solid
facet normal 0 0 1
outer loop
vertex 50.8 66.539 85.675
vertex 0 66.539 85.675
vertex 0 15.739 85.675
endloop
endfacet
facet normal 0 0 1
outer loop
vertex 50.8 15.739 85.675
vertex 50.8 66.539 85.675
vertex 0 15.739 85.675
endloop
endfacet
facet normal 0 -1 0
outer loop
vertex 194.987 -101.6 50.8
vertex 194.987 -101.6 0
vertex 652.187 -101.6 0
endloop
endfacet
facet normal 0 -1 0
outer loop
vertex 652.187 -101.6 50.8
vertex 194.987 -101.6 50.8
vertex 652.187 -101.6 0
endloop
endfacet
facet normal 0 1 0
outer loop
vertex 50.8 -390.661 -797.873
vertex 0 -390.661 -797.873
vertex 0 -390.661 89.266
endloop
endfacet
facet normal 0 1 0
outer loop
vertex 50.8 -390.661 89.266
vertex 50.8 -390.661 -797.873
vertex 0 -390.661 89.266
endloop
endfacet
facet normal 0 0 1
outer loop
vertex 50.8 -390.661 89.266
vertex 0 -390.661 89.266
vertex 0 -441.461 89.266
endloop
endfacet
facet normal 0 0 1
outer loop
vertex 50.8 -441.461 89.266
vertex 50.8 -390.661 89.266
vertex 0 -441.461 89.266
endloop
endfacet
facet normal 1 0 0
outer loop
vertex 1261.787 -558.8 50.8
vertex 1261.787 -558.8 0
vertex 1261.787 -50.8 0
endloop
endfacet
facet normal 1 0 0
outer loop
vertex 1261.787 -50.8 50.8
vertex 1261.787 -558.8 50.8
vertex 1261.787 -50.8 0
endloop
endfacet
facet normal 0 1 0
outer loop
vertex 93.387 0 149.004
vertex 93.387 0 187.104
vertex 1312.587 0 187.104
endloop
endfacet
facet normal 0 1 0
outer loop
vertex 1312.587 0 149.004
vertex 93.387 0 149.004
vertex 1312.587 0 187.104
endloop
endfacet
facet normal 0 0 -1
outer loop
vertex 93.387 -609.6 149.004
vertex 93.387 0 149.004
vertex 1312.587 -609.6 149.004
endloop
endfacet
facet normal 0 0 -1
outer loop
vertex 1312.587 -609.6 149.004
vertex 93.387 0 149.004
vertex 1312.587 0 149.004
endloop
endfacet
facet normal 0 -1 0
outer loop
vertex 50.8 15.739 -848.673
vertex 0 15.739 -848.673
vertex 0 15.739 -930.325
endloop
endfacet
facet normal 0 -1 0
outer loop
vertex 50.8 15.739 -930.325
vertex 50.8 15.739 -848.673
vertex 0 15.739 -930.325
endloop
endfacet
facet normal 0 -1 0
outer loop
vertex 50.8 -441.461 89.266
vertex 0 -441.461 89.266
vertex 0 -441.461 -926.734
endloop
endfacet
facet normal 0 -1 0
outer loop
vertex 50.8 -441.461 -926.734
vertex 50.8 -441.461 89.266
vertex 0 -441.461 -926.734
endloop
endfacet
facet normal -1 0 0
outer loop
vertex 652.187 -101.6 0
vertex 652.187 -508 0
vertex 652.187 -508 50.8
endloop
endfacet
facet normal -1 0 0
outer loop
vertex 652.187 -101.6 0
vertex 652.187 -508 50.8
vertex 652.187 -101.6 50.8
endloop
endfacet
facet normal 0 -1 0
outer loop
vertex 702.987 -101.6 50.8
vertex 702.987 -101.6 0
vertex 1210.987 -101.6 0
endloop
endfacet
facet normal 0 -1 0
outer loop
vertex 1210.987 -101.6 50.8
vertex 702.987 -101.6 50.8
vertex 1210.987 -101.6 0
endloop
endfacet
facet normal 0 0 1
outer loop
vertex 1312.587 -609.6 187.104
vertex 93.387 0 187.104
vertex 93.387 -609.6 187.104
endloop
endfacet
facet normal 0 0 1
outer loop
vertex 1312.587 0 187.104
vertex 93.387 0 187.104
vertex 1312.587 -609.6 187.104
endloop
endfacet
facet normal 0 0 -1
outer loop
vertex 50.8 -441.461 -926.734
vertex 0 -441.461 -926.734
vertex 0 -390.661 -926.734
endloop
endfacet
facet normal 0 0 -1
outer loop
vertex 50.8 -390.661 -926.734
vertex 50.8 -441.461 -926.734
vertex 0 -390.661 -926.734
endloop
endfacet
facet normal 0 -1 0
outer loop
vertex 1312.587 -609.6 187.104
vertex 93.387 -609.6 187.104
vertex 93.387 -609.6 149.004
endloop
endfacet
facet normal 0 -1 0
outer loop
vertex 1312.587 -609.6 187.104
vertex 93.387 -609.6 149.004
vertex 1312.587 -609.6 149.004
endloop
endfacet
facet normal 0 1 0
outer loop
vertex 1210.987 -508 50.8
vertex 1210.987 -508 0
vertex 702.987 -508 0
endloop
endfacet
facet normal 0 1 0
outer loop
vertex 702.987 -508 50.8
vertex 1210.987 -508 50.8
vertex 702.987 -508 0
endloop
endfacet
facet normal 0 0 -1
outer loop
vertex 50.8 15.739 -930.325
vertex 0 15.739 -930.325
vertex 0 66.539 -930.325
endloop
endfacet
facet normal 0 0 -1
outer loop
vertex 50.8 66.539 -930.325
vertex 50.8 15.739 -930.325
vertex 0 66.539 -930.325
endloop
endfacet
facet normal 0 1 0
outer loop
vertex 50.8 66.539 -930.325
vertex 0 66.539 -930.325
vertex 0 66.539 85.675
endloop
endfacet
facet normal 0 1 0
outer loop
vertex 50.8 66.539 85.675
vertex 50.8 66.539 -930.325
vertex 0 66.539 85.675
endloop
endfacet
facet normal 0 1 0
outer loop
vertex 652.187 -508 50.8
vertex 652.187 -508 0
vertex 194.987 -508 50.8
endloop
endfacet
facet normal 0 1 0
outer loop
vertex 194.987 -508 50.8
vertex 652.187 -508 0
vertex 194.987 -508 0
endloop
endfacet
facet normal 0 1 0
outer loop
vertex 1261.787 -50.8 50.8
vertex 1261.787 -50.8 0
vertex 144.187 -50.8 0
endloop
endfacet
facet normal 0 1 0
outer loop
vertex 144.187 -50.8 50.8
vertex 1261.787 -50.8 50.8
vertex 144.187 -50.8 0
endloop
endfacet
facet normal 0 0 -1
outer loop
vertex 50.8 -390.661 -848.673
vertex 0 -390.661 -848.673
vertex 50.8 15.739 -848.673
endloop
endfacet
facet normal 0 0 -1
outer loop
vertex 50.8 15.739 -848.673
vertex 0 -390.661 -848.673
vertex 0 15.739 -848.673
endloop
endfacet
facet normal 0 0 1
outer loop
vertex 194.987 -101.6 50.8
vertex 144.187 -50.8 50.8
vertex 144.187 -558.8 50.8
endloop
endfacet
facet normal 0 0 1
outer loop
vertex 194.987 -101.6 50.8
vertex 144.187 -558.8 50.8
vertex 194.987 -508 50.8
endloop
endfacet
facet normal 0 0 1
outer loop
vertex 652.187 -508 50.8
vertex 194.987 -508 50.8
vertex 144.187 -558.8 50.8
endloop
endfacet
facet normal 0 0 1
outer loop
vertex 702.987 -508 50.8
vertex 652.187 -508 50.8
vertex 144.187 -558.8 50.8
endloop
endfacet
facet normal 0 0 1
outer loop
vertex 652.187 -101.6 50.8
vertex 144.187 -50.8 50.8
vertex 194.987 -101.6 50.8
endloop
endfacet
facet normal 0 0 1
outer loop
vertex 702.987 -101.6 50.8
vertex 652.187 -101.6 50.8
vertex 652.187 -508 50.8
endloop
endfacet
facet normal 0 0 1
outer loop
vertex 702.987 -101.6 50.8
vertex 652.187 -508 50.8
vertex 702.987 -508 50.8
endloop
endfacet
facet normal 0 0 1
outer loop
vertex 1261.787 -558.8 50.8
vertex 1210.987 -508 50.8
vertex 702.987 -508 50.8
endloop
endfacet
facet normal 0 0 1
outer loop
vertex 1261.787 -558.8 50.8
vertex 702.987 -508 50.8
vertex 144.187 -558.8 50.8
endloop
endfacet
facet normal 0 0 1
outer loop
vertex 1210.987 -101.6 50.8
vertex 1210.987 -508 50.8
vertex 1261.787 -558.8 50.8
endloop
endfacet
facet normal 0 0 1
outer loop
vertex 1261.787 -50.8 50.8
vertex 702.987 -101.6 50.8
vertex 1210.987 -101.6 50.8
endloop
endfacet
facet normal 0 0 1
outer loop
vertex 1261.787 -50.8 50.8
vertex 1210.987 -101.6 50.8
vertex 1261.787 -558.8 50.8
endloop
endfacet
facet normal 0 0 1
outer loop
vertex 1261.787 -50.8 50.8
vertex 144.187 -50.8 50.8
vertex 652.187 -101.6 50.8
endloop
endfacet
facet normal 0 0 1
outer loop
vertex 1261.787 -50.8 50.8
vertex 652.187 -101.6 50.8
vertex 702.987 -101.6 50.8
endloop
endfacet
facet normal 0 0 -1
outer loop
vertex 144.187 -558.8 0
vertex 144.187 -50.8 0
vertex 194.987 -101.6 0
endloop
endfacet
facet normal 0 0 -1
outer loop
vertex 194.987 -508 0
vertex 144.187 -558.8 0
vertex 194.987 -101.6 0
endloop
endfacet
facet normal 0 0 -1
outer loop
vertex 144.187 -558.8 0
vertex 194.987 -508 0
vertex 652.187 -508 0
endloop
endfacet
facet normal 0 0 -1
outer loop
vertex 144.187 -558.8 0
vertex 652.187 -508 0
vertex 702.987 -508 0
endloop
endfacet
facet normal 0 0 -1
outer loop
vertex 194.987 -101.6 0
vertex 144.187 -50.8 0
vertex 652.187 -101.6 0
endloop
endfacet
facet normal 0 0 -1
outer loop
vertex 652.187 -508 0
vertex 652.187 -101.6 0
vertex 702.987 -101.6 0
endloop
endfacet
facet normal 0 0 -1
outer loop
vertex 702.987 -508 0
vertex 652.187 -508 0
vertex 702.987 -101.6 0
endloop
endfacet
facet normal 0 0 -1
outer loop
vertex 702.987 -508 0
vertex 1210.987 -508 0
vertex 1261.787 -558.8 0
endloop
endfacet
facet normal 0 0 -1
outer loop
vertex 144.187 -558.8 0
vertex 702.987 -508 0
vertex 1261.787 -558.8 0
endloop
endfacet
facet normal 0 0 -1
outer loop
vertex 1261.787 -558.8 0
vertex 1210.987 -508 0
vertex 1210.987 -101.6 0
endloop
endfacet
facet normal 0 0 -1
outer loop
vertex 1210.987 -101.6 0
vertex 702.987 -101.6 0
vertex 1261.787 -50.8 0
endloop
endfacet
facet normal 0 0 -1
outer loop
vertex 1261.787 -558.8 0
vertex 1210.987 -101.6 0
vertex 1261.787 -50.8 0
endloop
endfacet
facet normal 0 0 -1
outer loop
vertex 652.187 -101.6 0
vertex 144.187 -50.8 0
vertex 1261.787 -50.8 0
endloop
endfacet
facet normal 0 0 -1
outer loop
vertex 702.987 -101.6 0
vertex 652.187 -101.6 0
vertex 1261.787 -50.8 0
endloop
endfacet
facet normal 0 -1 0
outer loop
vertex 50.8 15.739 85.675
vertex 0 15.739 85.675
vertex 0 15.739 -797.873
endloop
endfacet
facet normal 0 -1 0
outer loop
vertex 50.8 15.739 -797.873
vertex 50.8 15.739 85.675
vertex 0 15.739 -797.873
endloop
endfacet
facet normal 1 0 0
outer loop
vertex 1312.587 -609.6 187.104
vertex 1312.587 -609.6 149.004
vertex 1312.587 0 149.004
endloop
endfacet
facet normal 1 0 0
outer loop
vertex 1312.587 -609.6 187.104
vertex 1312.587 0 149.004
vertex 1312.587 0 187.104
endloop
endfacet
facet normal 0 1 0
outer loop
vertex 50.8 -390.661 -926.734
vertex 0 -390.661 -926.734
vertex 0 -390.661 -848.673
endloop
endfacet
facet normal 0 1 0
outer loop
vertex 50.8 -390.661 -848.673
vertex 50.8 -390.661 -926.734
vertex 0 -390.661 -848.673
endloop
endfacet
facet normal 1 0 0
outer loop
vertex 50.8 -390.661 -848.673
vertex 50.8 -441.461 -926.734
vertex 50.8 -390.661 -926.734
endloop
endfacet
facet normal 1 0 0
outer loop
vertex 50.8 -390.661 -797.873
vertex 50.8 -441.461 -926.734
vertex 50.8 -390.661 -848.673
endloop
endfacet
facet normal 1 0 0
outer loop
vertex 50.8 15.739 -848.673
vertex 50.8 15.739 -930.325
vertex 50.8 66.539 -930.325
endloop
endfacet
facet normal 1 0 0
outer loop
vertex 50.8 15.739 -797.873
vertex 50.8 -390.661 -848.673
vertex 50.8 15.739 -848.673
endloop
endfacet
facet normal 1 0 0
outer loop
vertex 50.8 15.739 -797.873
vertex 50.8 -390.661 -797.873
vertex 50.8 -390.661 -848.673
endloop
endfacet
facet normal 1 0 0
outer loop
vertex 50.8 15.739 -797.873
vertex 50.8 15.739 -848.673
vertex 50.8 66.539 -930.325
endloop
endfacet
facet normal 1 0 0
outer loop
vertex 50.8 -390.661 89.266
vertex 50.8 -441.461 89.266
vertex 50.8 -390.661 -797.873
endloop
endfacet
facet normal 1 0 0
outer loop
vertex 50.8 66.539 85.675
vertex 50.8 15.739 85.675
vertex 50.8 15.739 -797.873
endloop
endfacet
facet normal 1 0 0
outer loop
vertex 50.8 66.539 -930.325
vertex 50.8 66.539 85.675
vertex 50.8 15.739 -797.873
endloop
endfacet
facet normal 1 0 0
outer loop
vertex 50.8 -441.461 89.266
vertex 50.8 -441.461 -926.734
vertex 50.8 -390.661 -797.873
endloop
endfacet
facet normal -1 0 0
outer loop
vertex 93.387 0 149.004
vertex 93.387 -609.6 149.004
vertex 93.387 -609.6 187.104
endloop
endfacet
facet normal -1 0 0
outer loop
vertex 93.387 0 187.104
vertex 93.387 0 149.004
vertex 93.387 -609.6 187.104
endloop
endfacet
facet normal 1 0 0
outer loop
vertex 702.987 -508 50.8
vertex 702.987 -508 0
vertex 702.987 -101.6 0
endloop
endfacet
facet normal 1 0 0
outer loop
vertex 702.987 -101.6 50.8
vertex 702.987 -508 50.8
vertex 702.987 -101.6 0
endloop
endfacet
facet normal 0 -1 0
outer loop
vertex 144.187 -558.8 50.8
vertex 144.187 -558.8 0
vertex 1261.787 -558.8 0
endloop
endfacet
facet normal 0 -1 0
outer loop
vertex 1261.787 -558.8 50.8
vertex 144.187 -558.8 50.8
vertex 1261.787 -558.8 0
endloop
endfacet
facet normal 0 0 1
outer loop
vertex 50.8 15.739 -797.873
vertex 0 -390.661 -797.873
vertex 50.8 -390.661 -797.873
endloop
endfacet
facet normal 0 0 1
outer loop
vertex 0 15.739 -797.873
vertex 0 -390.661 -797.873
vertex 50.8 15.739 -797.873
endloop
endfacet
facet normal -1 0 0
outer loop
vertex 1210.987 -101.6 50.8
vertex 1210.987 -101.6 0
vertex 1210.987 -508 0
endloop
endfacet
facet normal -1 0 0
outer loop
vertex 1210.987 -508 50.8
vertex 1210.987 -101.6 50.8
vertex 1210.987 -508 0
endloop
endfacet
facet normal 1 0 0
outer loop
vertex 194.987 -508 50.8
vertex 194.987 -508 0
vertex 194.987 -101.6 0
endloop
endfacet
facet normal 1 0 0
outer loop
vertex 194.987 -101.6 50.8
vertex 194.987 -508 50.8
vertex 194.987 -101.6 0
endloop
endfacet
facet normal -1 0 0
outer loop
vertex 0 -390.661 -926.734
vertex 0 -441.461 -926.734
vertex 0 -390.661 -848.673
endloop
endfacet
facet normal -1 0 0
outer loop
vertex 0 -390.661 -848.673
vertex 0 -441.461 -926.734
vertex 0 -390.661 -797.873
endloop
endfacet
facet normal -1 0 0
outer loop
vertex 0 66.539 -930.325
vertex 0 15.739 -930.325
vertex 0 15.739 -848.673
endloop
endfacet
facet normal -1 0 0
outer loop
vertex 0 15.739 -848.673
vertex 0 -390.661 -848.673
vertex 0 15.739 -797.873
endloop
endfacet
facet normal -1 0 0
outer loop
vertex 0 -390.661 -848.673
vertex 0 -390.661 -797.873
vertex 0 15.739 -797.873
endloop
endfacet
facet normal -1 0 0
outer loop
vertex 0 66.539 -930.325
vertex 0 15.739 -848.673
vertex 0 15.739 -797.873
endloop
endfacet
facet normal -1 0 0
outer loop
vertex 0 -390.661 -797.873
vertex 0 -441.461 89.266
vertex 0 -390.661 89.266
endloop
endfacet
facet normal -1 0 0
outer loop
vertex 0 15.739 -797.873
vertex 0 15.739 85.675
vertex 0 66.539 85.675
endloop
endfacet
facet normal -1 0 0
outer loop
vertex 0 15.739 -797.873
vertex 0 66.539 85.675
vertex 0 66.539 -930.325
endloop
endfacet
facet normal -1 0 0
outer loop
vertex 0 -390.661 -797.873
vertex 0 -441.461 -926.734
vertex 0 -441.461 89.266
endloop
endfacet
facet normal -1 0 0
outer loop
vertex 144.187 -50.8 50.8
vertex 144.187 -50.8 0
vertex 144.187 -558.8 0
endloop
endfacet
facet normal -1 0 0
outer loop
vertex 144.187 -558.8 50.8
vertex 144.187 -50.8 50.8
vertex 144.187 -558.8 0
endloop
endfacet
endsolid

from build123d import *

# Parameters (mm, degrees)
F0_W     = 406.4
F0_H     = 50.8
F1_DEPTH = 50.8
F2_W     = 1219.2
F2_H     = 38.1
F3_DEPTH = 609.6
F4_W     = 50.8
F4_H     = 50.8
F4_W_2   = 508
F4_H_2   = 406.4
F4_W_3   = 457.2
F5_DEPTH = 50.8


with BuildPart() as f1:
    # F0 (on Right) → F1 (new body)
    with BuildSketch(Plane.YZ):
        Polygon((66.5393716931, -930.3252109869), (66.5393716931, 85.6747890131), (15.7393716931, 85.6747890131), (15.7393716931, -797.8733963936), (15.7393716931, -848.6733963936), (15.7393716931, -930.3252109869), align=None)
        with Locations((-187.4606283069, -823.2733963936)):
            Rectangle(F0_W, F0_H)
        Polygon((-390.6606283069, -848.6733963936), (-390.6606283069, -797.8733963936), (-390.6606283069, 89.2663273811), (-441.4606283069, 89.2663273811), (-441.4606283069, -926.7336726189), (-390.6606283069, -926.7336726189), align=None)
    extrude(amount=F1_DEPTH)


with BuildPart() as f3:
    # F2 (on Front) → F3 (new body)
    with BuildSketch(Plane.XZ):
        with Locations((702.9868088187, 168.0535152555)):
            Rectangle(F2_W, F2_H)
    extrude(amount=F3_DEPTH)


with BuildPart() as f5:
    # F4 (on Top) → F5 (new body)
    with BuildSketch(Plane.XY):
        with Locations((1236.3868088187, -76.2)):
            Rectangle(F4_W, F4_H)
        with Locations((956.9868088187, -76.2)):
            Rectangle(F4_W_2, F4_H)
        with Locations((1236.3868088187, -304.8)):
            Rectangle(F4_W, F4_H_2)
        with Locations((677.5868088187, -76.2)):
            Rectangle(F4_W, F4_H)
        with Locations((1236.3868088187, -533.4)):
            Rectangle(F4_W, F4_H)
        with Locations((423.5868088187, -76.2)):
            Rectangle(F4_W_3, F4_H)
        with Locations((956.9868088187, -533.4)):
            Rectangle(F4_W_2, F4_H)
        with Locations((169.5868088187, -76.2)):
            Rectangle(F4_W, F4_H)
        with Locations((677.5868088187, -533.4)):
            Rectangle(F4_W, F4_H)
        with Locations((169.5868088187, -304.8)):
            Rectangle(F4_W, F4_H_2)
        with Locations((423.5868088187, -533.4)):
            Rectangle(F4_W_3, F4_H)
        with Locations((169.5868088187, -533.4)):
            Rectangle(F4_W, F4_H)
        with Locations((677.5868088187, -304.8)):
            Rectangle(F4_W, F4_H_2)
    extrude(amount=F5_DEPTH)


solid = Compound([f1.part, f3.part, f5.part])
